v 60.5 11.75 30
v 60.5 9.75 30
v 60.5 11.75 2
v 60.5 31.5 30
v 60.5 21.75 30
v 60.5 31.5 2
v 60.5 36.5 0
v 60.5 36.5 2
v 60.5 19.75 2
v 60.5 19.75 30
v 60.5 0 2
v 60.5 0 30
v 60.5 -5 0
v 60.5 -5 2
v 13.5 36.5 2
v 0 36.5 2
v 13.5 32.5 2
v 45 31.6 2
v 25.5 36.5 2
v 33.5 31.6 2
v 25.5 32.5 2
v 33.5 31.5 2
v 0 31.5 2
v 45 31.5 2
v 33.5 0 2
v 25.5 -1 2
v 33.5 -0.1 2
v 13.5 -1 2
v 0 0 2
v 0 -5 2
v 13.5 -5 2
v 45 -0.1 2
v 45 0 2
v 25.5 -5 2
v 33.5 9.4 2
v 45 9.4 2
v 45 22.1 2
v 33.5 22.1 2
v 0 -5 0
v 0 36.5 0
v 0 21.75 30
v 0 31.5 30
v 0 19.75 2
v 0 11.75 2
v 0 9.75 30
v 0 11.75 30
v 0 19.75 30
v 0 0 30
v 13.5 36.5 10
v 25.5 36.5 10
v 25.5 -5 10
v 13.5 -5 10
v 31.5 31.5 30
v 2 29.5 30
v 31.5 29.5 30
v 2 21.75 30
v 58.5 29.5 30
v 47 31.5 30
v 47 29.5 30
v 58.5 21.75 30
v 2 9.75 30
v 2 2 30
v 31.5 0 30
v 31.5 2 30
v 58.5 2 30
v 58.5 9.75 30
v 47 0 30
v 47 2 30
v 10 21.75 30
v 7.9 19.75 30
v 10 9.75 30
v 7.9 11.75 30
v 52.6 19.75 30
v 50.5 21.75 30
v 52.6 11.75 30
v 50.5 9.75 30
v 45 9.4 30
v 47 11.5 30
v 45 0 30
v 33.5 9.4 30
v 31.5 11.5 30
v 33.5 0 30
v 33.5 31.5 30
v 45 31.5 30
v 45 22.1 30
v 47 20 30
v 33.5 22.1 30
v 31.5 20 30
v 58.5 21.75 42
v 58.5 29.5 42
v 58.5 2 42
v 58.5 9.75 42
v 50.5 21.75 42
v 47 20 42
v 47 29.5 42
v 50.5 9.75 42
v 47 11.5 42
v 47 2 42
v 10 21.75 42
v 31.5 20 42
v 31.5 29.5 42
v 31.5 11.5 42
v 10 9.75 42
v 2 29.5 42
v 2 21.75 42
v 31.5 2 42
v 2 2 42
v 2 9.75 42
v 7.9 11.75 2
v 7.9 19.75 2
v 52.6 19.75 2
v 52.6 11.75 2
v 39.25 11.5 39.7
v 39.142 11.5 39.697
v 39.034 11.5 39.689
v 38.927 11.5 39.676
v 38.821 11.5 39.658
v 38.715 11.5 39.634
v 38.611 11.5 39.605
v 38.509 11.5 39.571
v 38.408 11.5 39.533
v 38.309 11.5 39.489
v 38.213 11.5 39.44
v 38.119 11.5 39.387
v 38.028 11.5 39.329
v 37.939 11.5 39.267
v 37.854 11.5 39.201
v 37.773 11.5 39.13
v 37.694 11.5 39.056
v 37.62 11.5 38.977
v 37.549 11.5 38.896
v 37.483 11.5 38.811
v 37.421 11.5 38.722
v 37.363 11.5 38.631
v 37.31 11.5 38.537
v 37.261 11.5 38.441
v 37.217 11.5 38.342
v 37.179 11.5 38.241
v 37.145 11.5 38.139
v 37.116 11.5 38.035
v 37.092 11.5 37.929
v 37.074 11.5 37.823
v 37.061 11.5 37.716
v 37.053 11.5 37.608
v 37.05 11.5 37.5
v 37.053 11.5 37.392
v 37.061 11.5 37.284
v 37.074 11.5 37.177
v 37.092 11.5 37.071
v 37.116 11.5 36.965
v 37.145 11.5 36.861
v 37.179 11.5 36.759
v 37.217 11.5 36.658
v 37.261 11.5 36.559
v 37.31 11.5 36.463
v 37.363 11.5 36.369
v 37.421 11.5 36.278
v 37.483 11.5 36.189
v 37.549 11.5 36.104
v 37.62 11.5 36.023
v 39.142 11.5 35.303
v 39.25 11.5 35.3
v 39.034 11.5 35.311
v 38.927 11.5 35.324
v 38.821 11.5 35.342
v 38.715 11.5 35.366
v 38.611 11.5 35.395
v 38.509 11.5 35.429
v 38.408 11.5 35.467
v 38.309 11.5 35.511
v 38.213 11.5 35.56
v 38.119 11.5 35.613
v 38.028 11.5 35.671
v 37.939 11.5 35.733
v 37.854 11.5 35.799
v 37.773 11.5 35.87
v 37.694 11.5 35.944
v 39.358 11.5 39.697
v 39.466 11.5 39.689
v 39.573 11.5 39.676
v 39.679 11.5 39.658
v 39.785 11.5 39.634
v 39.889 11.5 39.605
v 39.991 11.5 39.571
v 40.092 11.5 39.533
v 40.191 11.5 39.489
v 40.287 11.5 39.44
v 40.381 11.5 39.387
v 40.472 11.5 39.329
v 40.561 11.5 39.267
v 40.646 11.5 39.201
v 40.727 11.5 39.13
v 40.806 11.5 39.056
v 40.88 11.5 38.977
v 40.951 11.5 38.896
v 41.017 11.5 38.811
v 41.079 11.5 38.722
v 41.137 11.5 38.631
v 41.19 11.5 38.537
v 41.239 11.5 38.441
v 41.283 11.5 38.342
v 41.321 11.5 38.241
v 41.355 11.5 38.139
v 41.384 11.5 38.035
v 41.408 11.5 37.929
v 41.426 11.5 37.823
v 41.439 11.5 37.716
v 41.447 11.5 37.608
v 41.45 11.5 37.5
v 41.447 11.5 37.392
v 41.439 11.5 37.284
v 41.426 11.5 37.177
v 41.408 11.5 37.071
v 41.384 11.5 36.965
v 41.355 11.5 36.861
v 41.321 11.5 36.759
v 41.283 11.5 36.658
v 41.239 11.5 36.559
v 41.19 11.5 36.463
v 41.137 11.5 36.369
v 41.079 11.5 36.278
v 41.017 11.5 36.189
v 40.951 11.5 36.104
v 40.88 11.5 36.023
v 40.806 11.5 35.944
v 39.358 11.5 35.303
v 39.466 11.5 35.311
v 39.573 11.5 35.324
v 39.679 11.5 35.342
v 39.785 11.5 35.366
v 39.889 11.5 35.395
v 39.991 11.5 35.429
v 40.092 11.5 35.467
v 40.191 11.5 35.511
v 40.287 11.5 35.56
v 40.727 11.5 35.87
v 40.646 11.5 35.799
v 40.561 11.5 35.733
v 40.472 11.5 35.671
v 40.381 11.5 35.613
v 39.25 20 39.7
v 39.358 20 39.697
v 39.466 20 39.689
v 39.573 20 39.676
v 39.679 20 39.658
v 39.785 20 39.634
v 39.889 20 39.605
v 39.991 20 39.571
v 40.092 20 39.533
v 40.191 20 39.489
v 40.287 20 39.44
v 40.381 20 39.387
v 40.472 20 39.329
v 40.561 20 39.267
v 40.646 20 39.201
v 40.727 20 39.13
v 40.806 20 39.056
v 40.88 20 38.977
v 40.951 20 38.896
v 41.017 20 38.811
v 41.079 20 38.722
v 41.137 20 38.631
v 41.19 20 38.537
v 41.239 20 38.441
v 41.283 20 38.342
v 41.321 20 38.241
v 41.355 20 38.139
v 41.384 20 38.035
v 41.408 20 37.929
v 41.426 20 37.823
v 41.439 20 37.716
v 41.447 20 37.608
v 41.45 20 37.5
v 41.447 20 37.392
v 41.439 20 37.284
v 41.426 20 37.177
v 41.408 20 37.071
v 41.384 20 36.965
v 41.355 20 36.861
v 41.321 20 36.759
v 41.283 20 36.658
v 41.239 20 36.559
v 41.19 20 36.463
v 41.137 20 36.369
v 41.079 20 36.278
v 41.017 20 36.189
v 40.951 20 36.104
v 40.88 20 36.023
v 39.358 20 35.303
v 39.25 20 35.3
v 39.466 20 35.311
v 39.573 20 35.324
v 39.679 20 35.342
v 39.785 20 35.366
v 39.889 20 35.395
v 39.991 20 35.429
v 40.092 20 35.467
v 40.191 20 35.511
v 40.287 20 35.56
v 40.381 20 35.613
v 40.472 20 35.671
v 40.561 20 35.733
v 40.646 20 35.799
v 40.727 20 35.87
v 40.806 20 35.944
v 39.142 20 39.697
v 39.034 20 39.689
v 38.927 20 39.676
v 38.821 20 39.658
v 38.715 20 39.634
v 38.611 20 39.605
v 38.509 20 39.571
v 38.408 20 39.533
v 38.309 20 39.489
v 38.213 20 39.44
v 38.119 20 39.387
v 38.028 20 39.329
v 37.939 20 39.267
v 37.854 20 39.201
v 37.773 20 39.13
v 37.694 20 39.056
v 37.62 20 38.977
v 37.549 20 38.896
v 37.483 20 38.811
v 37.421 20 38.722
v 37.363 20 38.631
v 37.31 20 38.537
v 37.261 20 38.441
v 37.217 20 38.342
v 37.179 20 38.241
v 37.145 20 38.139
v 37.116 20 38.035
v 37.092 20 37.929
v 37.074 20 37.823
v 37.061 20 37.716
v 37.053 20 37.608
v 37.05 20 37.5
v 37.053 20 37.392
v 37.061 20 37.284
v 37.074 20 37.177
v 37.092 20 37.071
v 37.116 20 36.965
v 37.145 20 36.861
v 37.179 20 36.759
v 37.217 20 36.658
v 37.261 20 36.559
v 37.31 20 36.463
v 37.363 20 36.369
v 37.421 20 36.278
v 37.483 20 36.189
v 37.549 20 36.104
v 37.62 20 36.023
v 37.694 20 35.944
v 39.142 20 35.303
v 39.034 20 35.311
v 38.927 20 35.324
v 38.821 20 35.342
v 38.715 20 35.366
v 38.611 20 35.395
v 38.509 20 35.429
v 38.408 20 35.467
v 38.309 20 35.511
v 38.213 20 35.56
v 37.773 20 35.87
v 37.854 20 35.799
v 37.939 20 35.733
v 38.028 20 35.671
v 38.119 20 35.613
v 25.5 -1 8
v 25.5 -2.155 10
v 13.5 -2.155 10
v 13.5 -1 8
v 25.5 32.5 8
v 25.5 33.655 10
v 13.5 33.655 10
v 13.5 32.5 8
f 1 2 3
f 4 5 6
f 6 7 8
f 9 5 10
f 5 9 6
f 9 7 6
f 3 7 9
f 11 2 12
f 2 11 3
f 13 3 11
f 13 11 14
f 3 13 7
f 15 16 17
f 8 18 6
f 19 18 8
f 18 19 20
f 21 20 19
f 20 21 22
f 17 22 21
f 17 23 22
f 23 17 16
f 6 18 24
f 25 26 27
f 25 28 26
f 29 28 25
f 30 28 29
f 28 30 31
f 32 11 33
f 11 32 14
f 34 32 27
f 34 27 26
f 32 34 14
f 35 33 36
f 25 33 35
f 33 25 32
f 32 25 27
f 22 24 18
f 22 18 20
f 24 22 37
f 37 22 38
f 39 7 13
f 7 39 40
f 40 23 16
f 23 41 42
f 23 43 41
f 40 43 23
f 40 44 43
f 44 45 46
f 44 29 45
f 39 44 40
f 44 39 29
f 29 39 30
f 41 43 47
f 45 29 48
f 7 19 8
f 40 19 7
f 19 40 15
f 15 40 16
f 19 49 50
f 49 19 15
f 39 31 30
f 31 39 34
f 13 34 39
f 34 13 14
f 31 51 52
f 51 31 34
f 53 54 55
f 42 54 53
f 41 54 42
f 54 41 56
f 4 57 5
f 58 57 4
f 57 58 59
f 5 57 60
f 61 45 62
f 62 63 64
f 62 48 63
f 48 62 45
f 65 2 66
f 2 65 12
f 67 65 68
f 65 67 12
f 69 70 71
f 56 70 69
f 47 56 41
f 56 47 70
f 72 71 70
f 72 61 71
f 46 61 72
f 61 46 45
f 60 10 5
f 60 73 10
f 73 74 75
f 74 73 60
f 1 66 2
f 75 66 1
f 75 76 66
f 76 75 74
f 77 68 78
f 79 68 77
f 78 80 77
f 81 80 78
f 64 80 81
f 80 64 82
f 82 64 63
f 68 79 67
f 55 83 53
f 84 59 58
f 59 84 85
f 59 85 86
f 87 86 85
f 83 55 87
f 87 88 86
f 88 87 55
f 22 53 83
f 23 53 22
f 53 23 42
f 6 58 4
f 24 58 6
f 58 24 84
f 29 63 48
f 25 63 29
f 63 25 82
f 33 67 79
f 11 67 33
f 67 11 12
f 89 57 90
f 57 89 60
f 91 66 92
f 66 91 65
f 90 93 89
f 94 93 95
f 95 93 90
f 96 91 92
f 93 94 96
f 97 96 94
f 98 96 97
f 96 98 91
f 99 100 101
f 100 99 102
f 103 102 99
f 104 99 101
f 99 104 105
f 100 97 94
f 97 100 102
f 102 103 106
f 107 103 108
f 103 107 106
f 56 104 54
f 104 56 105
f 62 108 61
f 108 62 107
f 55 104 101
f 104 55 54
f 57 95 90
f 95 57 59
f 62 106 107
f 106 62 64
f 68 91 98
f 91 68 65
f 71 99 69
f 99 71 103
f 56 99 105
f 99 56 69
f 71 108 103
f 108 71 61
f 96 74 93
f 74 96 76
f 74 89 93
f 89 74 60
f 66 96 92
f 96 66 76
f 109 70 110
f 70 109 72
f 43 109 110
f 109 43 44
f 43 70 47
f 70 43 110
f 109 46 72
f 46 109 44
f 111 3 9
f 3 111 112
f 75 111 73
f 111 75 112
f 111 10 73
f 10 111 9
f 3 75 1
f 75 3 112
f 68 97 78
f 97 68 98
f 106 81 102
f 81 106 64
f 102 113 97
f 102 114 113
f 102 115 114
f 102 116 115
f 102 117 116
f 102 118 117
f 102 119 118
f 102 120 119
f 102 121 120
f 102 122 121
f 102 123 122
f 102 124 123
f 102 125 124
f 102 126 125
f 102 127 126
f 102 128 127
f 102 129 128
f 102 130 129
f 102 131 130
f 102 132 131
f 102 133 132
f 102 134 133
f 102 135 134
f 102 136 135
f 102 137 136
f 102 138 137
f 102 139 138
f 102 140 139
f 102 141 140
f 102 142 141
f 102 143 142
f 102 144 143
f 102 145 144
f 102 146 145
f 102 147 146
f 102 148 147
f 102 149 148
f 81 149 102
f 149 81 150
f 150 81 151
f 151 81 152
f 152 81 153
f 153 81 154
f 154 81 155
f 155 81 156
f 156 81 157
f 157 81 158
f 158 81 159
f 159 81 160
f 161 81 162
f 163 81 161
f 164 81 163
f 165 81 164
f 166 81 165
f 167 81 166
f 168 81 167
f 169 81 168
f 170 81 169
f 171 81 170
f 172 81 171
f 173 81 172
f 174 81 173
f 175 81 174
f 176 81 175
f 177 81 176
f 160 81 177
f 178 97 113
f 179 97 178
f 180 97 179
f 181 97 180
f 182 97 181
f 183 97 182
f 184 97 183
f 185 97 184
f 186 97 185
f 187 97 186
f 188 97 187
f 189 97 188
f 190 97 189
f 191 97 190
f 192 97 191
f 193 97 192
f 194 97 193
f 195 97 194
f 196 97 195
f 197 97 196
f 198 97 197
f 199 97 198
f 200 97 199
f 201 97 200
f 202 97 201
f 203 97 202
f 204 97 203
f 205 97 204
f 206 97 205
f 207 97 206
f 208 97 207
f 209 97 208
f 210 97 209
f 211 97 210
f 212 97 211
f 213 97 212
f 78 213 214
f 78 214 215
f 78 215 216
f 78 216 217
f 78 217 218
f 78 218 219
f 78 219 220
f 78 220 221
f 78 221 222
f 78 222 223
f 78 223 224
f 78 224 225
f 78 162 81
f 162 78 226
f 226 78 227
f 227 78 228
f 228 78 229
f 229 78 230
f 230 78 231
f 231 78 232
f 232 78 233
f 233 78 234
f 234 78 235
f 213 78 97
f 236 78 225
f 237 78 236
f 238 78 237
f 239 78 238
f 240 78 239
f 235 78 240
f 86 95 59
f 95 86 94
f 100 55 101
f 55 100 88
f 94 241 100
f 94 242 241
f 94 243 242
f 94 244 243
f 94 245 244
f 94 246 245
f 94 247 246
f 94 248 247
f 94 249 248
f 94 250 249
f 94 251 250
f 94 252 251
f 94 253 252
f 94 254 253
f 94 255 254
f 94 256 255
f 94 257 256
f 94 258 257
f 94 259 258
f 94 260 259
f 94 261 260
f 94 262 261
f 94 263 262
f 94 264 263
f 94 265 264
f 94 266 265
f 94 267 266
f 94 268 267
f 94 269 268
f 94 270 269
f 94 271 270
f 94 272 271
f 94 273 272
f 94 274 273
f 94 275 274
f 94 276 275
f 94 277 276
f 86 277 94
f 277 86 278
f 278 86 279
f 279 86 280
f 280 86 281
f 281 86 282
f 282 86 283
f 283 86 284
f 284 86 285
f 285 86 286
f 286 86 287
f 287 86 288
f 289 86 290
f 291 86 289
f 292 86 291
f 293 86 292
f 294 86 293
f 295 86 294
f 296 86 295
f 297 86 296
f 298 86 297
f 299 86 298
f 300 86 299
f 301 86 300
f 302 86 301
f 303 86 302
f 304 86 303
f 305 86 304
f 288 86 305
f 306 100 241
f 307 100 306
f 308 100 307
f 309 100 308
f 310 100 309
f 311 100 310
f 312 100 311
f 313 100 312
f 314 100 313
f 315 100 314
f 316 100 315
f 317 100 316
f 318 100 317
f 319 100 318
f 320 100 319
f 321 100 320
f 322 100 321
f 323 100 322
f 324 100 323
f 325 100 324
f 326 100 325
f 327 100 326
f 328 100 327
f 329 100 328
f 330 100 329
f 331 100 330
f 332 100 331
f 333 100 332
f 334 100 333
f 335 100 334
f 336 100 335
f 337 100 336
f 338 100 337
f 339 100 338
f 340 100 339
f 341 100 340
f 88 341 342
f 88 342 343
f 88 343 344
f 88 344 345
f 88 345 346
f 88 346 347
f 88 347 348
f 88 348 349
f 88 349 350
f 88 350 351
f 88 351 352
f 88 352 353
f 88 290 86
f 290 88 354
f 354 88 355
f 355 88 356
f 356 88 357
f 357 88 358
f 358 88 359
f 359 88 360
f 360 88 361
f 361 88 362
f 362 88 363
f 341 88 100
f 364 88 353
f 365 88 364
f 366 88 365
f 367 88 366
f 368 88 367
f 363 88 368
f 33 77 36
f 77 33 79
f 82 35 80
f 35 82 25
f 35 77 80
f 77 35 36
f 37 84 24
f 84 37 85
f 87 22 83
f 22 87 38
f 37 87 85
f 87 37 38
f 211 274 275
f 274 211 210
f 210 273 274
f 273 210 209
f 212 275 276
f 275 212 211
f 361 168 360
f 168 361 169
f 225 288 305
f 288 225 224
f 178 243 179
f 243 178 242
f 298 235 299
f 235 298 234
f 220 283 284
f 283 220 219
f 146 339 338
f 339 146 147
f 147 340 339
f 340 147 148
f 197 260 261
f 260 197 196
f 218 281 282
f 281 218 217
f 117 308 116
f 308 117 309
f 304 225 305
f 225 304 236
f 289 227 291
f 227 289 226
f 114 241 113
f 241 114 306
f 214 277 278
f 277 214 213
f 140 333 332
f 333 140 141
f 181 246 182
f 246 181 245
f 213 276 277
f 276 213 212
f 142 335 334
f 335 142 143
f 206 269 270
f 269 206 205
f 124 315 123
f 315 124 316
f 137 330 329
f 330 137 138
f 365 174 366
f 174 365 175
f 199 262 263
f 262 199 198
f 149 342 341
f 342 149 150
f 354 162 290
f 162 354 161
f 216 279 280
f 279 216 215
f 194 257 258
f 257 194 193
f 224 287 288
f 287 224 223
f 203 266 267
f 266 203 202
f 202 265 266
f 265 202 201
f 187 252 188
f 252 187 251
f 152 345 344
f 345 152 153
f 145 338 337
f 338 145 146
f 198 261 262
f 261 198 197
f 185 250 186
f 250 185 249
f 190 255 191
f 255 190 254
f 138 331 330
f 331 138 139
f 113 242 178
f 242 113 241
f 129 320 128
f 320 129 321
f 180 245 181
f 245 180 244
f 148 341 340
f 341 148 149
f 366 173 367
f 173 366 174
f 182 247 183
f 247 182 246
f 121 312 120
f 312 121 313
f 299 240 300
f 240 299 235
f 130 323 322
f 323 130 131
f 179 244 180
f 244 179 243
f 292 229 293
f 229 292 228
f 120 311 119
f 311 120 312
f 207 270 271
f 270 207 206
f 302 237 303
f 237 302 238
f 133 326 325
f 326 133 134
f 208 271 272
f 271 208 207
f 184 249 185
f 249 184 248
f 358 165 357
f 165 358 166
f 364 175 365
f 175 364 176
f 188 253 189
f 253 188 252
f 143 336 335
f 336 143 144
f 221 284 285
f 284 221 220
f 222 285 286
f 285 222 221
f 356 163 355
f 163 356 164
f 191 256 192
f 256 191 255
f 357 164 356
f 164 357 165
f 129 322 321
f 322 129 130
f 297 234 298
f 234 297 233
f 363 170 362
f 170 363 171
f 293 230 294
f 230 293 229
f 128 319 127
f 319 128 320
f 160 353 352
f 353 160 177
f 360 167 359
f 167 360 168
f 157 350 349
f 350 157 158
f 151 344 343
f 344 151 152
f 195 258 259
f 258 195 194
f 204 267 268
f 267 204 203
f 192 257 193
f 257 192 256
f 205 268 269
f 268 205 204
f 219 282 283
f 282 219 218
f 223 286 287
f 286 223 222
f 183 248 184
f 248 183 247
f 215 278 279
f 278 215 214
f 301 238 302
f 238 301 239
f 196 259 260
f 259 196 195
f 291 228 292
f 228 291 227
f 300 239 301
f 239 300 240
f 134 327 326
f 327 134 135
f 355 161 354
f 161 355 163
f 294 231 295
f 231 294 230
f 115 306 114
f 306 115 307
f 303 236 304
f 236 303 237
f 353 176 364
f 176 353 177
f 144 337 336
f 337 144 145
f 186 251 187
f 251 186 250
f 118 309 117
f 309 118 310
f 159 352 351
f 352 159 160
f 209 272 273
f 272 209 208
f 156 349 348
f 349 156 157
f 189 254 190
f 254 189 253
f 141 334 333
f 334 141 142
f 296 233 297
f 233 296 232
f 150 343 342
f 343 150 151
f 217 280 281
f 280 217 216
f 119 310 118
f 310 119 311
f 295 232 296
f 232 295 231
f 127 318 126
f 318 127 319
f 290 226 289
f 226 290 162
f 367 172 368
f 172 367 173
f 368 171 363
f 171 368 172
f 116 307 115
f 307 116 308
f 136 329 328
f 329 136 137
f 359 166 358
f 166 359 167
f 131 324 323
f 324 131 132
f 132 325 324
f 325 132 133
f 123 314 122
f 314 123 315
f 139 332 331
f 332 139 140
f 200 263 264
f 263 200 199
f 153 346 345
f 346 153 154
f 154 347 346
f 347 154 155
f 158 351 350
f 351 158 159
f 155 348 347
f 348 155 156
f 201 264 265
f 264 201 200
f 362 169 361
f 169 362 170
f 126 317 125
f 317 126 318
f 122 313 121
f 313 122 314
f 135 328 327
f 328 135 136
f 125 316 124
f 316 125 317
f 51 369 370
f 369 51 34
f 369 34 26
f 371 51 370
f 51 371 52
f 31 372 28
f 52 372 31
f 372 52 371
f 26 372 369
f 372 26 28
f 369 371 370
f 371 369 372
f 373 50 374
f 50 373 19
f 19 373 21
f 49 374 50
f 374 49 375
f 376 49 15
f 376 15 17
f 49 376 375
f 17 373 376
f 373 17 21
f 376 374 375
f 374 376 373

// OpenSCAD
$fn = 128;

height = 30;
insert = 12;

width = 60.5;
depth = 31.5;

w1 = 10;
d1 = 12;

w2 = 15.5;
d2 = 11.5;
x2 = 31.5;


// screw head M8
screwLength = 30.5;
screwDiameter = 8;
headWidth = 12.8;
headDiameter = 14.8;
headHeight = 5.4;

difference() {
    union() {
        // base
        translate([0, -5, 0])
        cube([width, depth + 10, 2]);

        // foot
        cube([width, depth, height]);

        // insert
        translate([2, 2, 0])
        cube([width-4, depth-4, height+insert]);
    }
    
    // notches
    translate([0, (depth-d1)/2, height])
    cube([w1, d1, insert+1]);
    translate([width-w1, (depth-d1)/2, height])
    cube([w1, d1, insert+1]);

    translate([-0.1, (depth-d1+4)/2, 2])
    cube([w1-2, d1-4, 100]);
    translate([width-w1+2.1, (depth-d1+4)/2, 2])
    cube([w1-2, d1-4, 100]);


    // side notches
    translate([x2, 0, height])
    cube([w2, d2, insert+1]);
    translate([x2, depth-d2, height])
    cube([w2, d2, insert+1]);
    
    translate([x2+2, -0.1, 2])
    cube([w2-4, d2-2, 100]);
    translate([x2+2, depth-d2+2.1, 2])
    cube([w2-4, d2-2, 100]);
    
    // fixation screw
    translate([x2+w2/2, 0, height + 7.5])
    rotate([-90, 0, 0])
    cylinder(h=100, d=4.4);
}


// board holders
translate([13.5, -5, 0])
difference() {
    cube([12, 4, 10]);

    translate([-1, 4, 8])
    rotate([30, 0, 0])
    cube([14, 4, 4]);
}

translate([13.5, depth + 1, 0])
difference() {
    cube([12, 4, 10]);

    translate([-1, 0, 8])
    rotate([60, 0, 0])
    cube([14, 4, 4]);
}
